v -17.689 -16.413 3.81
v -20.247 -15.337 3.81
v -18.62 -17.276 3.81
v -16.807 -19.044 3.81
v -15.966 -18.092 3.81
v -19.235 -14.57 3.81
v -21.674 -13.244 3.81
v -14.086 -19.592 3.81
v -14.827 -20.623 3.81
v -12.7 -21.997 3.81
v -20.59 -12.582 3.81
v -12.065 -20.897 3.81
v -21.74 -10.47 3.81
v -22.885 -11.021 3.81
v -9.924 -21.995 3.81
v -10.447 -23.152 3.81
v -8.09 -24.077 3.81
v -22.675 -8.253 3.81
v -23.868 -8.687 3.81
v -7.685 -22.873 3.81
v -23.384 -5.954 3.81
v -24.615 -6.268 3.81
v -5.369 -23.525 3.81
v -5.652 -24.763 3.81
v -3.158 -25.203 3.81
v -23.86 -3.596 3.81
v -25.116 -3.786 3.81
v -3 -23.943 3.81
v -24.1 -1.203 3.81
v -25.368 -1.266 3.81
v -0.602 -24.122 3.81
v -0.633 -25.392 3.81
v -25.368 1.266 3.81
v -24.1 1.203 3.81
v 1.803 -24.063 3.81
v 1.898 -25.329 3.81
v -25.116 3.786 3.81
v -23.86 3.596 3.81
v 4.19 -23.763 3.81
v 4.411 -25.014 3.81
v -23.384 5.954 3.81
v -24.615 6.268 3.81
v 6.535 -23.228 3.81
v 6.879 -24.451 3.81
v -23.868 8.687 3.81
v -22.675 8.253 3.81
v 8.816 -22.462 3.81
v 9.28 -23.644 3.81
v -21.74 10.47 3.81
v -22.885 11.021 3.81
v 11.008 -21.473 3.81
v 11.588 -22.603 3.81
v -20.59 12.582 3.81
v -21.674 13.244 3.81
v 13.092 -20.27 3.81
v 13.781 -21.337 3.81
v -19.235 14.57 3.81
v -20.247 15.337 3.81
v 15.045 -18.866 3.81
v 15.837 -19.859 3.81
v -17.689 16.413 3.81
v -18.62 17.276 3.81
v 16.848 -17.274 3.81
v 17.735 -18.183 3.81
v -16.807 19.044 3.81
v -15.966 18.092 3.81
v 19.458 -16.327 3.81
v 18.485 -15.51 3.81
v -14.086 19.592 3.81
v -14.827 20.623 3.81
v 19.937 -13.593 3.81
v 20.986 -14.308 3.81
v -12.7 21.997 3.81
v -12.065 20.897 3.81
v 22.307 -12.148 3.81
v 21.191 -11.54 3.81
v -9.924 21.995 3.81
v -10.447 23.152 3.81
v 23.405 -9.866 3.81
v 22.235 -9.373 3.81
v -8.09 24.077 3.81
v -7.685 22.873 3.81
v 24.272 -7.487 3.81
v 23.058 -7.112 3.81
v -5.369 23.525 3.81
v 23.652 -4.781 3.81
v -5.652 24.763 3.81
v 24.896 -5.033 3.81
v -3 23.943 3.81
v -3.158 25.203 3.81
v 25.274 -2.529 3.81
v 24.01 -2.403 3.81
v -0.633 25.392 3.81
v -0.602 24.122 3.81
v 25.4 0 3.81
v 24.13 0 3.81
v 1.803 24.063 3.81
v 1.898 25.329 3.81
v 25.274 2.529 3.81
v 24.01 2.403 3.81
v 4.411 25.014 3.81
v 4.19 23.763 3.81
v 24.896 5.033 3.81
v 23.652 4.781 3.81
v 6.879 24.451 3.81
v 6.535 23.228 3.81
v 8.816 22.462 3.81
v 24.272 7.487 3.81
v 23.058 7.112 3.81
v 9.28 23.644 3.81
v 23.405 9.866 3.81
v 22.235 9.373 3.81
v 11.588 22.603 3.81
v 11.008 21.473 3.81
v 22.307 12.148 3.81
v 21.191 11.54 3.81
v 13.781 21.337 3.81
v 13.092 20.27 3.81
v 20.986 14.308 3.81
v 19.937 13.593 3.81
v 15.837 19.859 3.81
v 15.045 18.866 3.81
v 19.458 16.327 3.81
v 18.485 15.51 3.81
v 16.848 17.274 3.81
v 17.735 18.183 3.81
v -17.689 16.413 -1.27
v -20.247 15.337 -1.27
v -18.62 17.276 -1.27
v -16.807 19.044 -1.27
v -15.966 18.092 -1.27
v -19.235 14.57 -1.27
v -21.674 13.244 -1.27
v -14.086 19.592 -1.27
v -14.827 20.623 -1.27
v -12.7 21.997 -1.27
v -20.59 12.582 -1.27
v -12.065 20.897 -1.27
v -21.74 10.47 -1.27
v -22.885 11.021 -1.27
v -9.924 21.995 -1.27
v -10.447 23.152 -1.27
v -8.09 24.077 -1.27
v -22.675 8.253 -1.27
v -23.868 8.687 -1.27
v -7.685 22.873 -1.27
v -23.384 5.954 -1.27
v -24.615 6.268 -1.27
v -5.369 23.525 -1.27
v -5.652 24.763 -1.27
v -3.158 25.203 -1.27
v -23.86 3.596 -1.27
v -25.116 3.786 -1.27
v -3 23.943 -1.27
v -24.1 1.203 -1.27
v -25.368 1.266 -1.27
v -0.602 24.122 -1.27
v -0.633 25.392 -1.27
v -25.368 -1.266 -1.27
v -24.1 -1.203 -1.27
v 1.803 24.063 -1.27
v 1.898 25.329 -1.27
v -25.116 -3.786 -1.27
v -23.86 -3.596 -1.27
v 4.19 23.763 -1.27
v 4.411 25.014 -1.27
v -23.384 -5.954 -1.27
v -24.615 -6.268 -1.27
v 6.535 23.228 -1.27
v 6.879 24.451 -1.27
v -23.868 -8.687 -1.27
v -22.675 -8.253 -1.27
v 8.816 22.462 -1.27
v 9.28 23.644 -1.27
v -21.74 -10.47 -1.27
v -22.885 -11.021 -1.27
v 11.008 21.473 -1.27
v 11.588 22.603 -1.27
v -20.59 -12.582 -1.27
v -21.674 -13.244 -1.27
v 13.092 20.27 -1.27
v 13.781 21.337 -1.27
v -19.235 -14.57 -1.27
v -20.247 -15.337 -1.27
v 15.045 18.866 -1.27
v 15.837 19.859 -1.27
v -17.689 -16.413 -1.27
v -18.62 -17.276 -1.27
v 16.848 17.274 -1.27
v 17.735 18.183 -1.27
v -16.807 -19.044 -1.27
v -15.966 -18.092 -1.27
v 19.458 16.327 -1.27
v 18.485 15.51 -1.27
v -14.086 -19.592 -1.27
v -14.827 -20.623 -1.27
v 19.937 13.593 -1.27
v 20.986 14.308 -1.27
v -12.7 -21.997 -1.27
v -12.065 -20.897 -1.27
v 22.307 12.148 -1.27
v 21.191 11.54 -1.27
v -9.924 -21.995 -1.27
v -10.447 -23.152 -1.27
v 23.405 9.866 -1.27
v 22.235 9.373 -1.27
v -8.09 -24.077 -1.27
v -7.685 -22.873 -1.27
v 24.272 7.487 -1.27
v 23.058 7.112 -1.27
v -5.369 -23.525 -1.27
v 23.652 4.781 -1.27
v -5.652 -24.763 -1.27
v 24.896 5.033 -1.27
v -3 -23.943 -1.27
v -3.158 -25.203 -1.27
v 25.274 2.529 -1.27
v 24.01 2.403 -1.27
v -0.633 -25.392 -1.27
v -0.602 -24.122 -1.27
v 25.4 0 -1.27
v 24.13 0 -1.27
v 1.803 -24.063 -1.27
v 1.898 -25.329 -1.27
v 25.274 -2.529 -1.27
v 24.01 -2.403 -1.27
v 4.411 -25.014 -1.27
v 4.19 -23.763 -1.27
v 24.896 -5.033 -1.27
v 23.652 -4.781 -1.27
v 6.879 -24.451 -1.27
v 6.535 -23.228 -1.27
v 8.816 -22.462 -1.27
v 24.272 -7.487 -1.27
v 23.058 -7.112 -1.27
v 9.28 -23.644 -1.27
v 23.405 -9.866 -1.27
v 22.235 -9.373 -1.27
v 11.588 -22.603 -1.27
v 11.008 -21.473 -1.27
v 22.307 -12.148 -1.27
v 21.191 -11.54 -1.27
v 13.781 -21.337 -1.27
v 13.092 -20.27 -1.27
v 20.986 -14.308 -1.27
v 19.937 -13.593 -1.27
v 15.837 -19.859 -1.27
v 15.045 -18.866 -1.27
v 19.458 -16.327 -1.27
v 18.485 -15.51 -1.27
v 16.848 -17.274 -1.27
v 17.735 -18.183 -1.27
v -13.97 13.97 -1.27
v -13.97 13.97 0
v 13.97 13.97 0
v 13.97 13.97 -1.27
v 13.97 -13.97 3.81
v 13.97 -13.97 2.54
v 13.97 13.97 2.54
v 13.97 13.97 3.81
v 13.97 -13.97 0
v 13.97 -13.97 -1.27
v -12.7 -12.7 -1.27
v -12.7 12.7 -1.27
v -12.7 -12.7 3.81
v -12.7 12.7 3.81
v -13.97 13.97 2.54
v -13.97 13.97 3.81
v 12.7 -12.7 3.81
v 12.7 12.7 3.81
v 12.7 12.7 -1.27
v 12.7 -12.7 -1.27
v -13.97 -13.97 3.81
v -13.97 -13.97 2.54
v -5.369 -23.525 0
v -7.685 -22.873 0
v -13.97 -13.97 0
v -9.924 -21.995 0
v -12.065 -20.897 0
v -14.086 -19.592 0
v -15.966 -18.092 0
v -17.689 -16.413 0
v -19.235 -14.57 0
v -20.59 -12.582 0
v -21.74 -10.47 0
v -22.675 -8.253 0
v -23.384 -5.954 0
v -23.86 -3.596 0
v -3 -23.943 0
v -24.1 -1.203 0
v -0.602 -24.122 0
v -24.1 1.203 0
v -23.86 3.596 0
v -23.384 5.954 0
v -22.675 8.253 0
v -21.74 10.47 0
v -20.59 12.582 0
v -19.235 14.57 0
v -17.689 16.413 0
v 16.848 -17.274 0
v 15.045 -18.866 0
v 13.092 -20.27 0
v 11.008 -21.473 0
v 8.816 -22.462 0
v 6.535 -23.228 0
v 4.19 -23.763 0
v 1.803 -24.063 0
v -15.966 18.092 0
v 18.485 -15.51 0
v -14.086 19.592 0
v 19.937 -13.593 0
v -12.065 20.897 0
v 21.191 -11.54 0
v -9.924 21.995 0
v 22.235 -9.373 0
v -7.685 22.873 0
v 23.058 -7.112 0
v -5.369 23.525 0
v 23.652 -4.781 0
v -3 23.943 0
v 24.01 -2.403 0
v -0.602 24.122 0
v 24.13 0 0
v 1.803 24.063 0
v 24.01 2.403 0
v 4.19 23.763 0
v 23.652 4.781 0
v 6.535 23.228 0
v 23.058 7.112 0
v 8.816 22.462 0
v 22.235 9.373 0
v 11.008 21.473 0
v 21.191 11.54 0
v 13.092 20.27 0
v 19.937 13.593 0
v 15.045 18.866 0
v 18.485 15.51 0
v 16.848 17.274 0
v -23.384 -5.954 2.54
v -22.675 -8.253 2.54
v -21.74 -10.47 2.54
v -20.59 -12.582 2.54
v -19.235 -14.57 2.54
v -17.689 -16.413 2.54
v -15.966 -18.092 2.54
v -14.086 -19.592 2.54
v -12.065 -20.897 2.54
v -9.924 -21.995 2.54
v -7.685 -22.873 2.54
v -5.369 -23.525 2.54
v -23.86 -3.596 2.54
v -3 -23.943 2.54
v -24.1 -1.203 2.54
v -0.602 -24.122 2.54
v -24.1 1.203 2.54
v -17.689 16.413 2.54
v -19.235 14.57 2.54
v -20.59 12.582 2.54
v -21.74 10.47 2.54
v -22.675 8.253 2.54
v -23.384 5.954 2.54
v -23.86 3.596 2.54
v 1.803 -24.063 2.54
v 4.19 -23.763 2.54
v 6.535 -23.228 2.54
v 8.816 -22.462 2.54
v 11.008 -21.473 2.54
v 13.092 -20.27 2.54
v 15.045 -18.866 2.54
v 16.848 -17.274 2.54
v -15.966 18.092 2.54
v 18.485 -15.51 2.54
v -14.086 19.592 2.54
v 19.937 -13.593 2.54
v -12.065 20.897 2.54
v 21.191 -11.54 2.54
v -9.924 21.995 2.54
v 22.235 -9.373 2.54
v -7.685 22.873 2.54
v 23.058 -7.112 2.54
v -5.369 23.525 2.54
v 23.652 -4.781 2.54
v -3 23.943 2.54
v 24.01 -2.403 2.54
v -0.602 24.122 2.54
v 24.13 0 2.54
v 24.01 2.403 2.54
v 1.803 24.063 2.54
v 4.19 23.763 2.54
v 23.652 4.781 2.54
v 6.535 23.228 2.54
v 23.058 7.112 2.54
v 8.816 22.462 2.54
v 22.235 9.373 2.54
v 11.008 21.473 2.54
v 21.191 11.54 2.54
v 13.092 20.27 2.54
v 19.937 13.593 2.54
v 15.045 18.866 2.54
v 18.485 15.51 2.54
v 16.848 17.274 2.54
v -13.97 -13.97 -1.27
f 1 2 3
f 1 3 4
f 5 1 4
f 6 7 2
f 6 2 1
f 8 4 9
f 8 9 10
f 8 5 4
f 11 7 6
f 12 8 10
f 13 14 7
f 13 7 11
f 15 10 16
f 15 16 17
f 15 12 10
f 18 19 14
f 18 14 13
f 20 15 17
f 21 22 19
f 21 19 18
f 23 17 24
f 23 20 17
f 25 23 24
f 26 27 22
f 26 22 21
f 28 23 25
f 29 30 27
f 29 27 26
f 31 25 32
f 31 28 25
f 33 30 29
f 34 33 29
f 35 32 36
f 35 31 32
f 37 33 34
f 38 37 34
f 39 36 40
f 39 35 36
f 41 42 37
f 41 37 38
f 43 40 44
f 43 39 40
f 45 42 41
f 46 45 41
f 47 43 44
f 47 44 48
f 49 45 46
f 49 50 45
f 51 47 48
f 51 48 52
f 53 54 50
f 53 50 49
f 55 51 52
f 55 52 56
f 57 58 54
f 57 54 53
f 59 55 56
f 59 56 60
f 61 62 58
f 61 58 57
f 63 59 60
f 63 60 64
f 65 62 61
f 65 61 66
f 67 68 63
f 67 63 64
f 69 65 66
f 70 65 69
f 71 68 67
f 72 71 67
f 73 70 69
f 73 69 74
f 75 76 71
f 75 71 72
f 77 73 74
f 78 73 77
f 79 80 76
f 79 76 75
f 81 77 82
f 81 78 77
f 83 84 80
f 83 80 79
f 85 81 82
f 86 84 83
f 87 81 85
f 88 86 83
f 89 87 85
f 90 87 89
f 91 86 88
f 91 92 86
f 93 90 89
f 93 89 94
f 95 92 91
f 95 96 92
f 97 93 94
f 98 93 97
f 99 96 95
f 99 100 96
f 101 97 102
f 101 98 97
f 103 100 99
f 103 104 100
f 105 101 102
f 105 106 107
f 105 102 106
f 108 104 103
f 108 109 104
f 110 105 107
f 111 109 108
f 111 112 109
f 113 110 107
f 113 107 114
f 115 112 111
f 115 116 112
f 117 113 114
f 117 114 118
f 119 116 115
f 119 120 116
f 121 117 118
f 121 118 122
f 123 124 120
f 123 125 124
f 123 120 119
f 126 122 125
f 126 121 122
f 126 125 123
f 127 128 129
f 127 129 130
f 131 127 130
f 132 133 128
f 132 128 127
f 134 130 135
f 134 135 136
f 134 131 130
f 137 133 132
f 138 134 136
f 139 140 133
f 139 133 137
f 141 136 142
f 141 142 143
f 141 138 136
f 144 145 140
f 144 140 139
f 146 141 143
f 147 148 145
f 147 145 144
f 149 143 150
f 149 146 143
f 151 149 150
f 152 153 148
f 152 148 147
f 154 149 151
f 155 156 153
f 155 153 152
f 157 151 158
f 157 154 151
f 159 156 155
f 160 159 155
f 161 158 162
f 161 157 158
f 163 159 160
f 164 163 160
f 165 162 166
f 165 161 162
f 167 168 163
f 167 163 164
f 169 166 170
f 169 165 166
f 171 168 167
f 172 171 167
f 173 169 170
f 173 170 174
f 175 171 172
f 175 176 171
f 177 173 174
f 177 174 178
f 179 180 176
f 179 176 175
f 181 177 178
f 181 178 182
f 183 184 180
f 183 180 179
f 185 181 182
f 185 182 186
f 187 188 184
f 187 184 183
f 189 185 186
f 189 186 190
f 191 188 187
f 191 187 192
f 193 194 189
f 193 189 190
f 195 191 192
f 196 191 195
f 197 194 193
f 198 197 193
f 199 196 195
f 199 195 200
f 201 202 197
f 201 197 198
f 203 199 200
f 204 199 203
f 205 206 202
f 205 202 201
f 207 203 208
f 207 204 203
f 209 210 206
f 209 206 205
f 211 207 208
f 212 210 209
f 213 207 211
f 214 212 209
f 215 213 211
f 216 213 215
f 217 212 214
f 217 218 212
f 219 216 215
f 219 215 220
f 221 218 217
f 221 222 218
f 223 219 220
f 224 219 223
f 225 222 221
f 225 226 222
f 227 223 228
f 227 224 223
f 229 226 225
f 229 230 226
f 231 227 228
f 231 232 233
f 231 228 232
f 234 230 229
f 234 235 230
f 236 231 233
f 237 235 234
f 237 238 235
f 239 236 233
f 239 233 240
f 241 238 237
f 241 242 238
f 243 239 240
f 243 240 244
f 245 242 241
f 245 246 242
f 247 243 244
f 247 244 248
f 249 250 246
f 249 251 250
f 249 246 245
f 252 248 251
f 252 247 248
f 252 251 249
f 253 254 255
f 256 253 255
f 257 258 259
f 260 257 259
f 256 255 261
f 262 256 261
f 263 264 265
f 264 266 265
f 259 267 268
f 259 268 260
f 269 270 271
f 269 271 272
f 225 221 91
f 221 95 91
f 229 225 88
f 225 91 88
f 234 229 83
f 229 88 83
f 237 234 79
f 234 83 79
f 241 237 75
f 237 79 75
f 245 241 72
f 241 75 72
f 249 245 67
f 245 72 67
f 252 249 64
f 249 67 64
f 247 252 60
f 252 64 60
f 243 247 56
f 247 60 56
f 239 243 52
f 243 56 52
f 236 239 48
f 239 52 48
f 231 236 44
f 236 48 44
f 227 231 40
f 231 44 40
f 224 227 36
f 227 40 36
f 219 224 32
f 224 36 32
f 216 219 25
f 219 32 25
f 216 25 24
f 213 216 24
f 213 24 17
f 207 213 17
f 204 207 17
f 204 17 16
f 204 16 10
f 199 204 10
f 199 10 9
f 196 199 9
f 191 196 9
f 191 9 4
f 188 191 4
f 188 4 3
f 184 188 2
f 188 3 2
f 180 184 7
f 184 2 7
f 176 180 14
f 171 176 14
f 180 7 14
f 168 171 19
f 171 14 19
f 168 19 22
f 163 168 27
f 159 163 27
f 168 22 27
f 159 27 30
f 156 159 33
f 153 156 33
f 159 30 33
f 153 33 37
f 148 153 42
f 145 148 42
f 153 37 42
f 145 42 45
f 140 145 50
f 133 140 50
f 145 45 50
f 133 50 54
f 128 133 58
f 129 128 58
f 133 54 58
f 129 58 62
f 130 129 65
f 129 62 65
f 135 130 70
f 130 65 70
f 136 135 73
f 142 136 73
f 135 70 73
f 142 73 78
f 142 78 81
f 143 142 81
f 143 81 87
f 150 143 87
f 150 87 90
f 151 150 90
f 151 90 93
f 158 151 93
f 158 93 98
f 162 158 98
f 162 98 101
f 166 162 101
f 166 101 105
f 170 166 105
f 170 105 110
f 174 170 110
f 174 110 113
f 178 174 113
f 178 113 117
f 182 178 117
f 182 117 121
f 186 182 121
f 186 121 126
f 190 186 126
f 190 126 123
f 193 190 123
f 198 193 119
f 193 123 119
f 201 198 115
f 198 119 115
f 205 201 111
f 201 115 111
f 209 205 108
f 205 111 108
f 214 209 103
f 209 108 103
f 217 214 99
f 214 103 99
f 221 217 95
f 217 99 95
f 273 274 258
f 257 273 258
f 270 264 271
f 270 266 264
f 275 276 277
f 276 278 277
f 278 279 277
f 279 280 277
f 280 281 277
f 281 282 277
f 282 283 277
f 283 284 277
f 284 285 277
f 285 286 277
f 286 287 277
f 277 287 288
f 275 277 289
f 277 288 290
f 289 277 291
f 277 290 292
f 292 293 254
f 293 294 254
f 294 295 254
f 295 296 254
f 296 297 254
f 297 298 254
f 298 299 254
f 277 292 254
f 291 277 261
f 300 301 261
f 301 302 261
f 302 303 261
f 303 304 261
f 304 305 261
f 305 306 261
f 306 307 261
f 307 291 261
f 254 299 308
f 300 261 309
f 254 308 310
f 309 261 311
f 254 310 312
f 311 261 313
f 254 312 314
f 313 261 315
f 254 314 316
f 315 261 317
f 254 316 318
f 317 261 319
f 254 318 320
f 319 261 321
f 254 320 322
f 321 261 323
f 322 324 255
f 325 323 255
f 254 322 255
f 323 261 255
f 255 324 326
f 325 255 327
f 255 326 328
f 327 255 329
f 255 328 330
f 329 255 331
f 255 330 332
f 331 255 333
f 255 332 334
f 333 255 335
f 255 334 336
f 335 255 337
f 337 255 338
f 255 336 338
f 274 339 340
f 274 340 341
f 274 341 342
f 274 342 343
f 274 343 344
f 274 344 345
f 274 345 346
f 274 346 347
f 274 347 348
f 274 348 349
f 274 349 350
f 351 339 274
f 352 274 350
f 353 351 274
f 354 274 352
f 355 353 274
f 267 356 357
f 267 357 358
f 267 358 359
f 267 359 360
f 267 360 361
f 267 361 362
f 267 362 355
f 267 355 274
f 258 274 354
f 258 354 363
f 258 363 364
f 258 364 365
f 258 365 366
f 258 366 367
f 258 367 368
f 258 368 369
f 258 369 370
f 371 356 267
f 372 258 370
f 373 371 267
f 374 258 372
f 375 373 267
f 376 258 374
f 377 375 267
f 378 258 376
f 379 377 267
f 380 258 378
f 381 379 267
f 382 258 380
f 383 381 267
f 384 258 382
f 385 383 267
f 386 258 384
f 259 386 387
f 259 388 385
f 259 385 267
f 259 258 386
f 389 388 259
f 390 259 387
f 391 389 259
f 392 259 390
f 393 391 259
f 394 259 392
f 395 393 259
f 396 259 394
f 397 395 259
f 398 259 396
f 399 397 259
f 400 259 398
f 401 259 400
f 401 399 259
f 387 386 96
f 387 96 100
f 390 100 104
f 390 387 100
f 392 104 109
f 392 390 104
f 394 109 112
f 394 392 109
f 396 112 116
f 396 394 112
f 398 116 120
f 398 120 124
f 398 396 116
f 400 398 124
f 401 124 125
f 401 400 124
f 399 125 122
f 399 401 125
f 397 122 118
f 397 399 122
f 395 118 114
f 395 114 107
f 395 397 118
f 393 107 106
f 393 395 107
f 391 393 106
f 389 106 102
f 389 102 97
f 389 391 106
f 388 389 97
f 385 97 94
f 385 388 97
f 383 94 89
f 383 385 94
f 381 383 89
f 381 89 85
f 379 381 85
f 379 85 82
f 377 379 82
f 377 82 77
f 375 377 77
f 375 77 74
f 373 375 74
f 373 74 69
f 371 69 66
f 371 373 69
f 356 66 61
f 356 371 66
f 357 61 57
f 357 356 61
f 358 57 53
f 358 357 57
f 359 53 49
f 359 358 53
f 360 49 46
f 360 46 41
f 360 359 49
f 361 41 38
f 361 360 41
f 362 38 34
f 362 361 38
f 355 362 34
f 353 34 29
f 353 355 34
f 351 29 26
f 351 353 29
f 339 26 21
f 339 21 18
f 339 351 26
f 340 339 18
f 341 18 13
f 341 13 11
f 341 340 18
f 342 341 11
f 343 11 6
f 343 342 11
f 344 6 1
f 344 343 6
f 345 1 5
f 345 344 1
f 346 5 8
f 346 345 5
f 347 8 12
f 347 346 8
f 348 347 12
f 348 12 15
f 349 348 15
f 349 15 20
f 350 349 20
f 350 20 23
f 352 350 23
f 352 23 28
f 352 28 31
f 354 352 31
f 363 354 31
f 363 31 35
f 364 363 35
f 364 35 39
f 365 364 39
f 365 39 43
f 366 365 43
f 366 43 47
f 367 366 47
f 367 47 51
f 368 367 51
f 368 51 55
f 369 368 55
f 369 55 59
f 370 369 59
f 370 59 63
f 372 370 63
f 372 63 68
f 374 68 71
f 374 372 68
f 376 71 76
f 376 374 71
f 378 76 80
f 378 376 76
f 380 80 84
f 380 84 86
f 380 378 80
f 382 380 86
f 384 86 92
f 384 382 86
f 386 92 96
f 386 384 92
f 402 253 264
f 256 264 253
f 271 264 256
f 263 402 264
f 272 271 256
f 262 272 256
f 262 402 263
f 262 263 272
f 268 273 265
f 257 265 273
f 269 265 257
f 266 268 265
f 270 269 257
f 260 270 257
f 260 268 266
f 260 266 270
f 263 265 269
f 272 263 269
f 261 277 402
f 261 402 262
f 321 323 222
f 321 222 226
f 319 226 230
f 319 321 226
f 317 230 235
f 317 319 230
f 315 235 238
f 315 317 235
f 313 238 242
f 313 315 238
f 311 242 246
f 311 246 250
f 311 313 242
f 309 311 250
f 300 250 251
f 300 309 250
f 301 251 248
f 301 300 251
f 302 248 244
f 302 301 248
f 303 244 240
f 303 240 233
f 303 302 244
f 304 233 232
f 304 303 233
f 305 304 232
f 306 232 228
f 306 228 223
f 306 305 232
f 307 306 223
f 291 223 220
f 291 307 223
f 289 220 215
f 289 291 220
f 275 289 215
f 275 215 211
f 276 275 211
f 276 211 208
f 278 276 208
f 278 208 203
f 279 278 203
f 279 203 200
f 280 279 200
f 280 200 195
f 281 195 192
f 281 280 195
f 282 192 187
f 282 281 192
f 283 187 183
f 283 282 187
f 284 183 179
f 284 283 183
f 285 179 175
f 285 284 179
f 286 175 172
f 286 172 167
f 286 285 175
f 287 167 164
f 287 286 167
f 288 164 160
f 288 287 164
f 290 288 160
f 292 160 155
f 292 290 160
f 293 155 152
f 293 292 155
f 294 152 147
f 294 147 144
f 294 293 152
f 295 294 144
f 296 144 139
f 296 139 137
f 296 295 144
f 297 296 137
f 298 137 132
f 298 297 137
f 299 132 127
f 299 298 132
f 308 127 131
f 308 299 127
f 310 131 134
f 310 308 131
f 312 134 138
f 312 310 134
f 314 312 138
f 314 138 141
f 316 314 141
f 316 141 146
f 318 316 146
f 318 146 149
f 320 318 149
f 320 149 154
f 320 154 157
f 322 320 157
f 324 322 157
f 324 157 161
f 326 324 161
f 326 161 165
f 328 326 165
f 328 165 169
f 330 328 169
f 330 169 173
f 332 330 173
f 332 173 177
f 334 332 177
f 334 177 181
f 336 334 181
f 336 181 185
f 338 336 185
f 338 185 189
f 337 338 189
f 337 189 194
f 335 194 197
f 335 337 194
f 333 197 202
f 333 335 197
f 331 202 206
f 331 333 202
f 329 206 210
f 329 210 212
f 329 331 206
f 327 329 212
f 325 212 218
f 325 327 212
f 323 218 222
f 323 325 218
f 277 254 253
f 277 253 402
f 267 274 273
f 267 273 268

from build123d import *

# Parameters (mm, degrees)
F0_R     = 25.4
F0_W     = 25.4
F0_H     = 25.4
F1_DEPTH = 2.54
F2_R     = 25.4
F2_R_2   = 24.13
F2_W     = 27.94
F2_H     = 27.94
F2_W_2   = 25.4
F2_H_2   = 25.4
F3_DEPTH = 1.27
F4_R     = 25.4
F4_R_2   = 24.13
F4_W     = 27.94
F4_H     = 27.94
F4_W_2   = 25.4
F4_H_2   = 25.4
F5_DEPTH = 1.27


with BuildPart() as f1:
    # F0 (on Top) → F1 (new body)
    with BuildSketch(Plane.XY):
        Circle(F0_R)
        Rectangle(F0_W, F0_H, mode=Mode.SUBTRACT)
    extrude(amount=F1_DEPTH)

    # F2 (on face) → F3 (join)
    with BuildSketch(Plane.XY.offset(2.54)):
        Circle(F2_R)
        Circle(F2_R_2, mode=Mode.SUBTRACT)
        Rectangle(F2_W, F2_H)
        Rectangle(F2_W_2, F2_H_2, mode=Mode.SUBTRACT)
    extrude(amount=F3_DEPTH)

    # F4 (on face) → F5 (join)
    with BuildSketch(Plane(origin=(0, 0, 0), x_dir=(1, 0, 0), z_dir=(0, 0, -1))):
        Circle(F4_R)
        Circle(F4_R_2, mode=Mode.SUBTRACT)
        Rectangle(F4_W, F4_H)
        Rectangle(F4_W_2, F4_H_2, mode=Mode.SUBTRACT)
    extrude(amount=F5_DEPTH)


solid = f1.part
